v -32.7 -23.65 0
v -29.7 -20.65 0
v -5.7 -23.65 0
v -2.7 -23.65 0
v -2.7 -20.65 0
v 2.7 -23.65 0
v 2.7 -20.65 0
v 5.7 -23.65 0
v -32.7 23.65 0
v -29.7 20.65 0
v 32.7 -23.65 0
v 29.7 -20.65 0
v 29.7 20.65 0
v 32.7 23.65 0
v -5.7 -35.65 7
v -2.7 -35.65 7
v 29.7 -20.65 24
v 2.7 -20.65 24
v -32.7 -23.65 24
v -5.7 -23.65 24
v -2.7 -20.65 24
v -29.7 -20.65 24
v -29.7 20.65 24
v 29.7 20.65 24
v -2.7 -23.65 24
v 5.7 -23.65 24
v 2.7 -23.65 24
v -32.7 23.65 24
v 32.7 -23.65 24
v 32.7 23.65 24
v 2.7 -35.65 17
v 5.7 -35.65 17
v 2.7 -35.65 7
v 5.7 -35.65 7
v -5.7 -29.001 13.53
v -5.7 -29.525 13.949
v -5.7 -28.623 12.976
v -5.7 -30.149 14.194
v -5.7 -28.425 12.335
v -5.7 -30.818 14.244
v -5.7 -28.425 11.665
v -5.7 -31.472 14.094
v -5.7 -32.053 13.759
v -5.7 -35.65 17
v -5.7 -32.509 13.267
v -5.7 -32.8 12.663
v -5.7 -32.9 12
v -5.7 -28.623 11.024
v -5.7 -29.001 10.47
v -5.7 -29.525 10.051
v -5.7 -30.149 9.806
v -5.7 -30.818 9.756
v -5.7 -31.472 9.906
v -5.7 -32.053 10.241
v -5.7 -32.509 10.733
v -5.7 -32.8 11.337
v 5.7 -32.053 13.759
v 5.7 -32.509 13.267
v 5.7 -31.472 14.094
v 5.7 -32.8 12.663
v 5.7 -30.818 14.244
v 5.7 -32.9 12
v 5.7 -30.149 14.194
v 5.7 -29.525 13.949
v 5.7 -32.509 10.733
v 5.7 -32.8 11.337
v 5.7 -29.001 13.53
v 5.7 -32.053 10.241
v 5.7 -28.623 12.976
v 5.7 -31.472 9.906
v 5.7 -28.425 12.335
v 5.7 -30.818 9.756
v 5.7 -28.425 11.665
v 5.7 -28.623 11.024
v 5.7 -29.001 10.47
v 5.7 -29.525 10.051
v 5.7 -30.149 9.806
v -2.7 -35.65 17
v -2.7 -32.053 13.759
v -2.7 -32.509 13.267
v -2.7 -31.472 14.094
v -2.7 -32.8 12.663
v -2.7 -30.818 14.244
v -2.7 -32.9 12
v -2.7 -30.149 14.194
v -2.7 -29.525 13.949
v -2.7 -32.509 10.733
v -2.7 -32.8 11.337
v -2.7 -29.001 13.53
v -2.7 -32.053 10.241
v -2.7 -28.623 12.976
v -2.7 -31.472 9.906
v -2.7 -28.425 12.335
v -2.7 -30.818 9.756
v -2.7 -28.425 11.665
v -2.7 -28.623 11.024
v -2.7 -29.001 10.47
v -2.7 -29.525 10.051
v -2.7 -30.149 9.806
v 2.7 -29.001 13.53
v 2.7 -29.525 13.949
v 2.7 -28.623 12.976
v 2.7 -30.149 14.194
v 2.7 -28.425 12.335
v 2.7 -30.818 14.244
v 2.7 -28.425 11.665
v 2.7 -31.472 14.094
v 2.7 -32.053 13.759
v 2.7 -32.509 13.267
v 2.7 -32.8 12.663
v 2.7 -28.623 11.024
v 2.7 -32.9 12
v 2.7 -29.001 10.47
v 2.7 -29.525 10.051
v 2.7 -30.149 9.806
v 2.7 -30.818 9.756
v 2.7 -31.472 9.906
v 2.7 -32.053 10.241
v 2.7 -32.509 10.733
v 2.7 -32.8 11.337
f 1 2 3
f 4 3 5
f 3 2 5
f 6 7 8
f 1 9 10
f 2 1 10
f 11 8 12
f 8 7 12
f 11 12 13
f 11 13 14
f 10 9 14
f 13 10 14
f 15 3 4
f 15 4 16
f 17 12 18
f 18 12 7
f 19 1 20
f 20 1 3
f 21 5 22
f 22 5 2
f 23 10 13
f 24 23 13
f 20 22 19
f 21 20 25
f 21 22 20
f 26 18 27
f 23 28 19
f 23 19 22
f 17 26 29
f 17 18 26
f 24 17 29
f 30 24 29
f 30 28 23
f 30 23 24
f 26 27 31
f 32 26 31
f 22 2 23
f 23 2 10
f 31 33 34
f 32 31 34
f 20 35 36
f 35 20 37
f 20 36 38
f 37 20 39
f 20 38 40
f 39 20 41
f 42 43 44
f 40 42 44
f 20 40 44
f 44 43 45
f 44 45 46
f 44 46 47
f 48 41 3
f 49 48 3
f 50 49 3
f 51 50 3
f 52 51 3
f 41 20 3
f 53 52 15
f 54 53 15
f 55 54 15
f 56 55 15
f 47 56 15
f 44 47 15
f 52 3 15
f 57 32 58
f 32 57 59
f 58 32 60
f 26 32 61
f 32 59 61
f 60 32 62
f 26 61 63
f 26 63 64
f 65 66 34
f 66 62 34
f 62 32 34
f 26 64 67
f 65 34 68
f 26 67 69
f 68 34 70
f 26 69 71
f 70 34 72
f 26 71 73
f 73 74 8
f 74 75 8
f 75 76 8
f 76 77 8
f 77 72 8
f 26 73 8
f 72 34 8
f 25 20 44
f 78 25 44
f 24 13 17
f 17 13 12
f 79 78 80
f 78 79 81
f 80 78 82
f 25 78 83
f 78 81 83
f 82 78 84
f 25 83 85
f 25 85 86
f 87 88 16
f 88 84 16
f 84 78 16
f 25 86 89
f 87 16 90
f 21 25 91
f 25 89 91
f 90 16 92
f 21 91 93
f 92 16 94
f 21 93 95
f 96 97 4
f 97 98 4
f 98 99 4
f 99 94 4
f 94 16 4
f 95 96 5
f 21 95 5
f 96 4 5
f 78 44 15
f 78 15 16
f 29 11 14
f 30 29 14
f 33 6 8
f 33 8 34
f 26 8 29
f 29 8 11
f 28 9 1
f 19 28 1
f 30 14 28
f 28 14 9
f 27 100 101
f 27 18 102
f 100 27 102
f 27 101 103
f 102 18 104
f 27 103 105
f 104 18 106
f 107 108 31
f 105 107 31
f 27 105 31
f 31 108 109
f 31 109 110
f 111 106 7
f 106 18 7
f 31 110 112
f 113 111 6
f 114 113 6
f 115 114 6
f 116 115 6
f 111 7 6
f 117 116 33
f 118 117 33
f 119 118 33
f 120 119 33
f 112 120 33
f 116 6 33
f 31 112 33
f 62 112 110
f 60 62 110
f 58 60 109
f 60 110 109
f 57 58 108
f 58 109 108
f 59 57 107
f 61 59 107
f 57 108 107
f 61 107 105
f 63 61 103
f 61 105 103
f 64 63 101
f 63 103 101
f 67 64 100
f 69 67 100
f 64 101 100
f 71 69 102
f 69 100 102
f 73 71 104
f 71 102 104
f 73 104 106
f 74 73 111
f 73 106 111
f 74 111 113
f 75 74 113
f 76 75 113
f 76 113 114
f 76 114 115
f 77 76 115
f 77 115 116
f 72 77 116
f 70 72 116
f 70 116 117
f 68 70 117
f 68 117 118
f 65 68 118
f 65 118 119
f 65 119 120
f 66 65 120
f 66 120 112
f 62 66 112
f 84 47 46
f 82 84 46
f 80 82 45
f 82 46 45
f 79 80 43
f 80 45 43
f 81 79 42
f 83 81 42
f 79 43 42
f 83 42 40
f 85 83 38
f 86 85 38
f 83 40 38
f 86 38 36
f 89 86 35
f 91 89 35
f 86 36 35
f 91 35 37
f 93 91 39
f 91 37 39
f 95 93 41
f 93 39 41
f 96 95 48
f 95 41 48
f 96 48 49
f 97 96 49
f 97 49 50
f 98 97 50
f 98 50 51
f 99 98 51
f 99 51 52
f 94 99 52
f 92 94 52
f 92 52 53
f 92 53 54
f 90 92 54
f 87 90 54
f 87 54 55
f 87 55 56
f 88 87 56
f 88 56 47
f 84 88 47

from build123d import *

# Parameters (mm, degrees)
EXTRU_MINCE1_DEPTH      = 24
ESQUISSE2_R             = 2.25
ENL_V_MAT_EXTRU_1_DEPTH = 20


with BuildPart() as part:
    # Esquisse1 → Extru.-Mince1 (new body)
    with BuildSketch(Plane.XY):
        Polygon((-2.7, -35.65), (-2.7, -20.65), (-29.7, -20.65), (-29.7, 20.65), (29.7, 20.65), (29.7, -20.65), (2.7, -20.65), (2.7, -35.65), (5.7, -35.65), (5.7, -23.65), (32.7, -23.65), (32.7, 23.65), (-32.7, 23.65), (-32.7, -23.65), (-5.7, -23.65), (-5.7, -35.65), align=None)
    extrude(amount=EXTRU_MINCE1_DEPTH)

    # Esquisse2 → Enlèv. mat.-Extru.1 (cut)
    with BuildSketch(Plane.ZY.offset(5.7)):
        with Locations(Location((12, -30.65, 0), (0, 0, 270))):
            Circle(ESQUISSE2_R)
        Polygon((0, -23.65), (7, -35.65), (0, -35.65), align=None)
        Polygon((17, -35.65), (24, -35.65), (24, -23.65), align=None)
    extrude(amount=-ENL_V_MAT_EXTRU_1_DEPTH, mode=Mode.SUBTRACT)


solid = part.part
